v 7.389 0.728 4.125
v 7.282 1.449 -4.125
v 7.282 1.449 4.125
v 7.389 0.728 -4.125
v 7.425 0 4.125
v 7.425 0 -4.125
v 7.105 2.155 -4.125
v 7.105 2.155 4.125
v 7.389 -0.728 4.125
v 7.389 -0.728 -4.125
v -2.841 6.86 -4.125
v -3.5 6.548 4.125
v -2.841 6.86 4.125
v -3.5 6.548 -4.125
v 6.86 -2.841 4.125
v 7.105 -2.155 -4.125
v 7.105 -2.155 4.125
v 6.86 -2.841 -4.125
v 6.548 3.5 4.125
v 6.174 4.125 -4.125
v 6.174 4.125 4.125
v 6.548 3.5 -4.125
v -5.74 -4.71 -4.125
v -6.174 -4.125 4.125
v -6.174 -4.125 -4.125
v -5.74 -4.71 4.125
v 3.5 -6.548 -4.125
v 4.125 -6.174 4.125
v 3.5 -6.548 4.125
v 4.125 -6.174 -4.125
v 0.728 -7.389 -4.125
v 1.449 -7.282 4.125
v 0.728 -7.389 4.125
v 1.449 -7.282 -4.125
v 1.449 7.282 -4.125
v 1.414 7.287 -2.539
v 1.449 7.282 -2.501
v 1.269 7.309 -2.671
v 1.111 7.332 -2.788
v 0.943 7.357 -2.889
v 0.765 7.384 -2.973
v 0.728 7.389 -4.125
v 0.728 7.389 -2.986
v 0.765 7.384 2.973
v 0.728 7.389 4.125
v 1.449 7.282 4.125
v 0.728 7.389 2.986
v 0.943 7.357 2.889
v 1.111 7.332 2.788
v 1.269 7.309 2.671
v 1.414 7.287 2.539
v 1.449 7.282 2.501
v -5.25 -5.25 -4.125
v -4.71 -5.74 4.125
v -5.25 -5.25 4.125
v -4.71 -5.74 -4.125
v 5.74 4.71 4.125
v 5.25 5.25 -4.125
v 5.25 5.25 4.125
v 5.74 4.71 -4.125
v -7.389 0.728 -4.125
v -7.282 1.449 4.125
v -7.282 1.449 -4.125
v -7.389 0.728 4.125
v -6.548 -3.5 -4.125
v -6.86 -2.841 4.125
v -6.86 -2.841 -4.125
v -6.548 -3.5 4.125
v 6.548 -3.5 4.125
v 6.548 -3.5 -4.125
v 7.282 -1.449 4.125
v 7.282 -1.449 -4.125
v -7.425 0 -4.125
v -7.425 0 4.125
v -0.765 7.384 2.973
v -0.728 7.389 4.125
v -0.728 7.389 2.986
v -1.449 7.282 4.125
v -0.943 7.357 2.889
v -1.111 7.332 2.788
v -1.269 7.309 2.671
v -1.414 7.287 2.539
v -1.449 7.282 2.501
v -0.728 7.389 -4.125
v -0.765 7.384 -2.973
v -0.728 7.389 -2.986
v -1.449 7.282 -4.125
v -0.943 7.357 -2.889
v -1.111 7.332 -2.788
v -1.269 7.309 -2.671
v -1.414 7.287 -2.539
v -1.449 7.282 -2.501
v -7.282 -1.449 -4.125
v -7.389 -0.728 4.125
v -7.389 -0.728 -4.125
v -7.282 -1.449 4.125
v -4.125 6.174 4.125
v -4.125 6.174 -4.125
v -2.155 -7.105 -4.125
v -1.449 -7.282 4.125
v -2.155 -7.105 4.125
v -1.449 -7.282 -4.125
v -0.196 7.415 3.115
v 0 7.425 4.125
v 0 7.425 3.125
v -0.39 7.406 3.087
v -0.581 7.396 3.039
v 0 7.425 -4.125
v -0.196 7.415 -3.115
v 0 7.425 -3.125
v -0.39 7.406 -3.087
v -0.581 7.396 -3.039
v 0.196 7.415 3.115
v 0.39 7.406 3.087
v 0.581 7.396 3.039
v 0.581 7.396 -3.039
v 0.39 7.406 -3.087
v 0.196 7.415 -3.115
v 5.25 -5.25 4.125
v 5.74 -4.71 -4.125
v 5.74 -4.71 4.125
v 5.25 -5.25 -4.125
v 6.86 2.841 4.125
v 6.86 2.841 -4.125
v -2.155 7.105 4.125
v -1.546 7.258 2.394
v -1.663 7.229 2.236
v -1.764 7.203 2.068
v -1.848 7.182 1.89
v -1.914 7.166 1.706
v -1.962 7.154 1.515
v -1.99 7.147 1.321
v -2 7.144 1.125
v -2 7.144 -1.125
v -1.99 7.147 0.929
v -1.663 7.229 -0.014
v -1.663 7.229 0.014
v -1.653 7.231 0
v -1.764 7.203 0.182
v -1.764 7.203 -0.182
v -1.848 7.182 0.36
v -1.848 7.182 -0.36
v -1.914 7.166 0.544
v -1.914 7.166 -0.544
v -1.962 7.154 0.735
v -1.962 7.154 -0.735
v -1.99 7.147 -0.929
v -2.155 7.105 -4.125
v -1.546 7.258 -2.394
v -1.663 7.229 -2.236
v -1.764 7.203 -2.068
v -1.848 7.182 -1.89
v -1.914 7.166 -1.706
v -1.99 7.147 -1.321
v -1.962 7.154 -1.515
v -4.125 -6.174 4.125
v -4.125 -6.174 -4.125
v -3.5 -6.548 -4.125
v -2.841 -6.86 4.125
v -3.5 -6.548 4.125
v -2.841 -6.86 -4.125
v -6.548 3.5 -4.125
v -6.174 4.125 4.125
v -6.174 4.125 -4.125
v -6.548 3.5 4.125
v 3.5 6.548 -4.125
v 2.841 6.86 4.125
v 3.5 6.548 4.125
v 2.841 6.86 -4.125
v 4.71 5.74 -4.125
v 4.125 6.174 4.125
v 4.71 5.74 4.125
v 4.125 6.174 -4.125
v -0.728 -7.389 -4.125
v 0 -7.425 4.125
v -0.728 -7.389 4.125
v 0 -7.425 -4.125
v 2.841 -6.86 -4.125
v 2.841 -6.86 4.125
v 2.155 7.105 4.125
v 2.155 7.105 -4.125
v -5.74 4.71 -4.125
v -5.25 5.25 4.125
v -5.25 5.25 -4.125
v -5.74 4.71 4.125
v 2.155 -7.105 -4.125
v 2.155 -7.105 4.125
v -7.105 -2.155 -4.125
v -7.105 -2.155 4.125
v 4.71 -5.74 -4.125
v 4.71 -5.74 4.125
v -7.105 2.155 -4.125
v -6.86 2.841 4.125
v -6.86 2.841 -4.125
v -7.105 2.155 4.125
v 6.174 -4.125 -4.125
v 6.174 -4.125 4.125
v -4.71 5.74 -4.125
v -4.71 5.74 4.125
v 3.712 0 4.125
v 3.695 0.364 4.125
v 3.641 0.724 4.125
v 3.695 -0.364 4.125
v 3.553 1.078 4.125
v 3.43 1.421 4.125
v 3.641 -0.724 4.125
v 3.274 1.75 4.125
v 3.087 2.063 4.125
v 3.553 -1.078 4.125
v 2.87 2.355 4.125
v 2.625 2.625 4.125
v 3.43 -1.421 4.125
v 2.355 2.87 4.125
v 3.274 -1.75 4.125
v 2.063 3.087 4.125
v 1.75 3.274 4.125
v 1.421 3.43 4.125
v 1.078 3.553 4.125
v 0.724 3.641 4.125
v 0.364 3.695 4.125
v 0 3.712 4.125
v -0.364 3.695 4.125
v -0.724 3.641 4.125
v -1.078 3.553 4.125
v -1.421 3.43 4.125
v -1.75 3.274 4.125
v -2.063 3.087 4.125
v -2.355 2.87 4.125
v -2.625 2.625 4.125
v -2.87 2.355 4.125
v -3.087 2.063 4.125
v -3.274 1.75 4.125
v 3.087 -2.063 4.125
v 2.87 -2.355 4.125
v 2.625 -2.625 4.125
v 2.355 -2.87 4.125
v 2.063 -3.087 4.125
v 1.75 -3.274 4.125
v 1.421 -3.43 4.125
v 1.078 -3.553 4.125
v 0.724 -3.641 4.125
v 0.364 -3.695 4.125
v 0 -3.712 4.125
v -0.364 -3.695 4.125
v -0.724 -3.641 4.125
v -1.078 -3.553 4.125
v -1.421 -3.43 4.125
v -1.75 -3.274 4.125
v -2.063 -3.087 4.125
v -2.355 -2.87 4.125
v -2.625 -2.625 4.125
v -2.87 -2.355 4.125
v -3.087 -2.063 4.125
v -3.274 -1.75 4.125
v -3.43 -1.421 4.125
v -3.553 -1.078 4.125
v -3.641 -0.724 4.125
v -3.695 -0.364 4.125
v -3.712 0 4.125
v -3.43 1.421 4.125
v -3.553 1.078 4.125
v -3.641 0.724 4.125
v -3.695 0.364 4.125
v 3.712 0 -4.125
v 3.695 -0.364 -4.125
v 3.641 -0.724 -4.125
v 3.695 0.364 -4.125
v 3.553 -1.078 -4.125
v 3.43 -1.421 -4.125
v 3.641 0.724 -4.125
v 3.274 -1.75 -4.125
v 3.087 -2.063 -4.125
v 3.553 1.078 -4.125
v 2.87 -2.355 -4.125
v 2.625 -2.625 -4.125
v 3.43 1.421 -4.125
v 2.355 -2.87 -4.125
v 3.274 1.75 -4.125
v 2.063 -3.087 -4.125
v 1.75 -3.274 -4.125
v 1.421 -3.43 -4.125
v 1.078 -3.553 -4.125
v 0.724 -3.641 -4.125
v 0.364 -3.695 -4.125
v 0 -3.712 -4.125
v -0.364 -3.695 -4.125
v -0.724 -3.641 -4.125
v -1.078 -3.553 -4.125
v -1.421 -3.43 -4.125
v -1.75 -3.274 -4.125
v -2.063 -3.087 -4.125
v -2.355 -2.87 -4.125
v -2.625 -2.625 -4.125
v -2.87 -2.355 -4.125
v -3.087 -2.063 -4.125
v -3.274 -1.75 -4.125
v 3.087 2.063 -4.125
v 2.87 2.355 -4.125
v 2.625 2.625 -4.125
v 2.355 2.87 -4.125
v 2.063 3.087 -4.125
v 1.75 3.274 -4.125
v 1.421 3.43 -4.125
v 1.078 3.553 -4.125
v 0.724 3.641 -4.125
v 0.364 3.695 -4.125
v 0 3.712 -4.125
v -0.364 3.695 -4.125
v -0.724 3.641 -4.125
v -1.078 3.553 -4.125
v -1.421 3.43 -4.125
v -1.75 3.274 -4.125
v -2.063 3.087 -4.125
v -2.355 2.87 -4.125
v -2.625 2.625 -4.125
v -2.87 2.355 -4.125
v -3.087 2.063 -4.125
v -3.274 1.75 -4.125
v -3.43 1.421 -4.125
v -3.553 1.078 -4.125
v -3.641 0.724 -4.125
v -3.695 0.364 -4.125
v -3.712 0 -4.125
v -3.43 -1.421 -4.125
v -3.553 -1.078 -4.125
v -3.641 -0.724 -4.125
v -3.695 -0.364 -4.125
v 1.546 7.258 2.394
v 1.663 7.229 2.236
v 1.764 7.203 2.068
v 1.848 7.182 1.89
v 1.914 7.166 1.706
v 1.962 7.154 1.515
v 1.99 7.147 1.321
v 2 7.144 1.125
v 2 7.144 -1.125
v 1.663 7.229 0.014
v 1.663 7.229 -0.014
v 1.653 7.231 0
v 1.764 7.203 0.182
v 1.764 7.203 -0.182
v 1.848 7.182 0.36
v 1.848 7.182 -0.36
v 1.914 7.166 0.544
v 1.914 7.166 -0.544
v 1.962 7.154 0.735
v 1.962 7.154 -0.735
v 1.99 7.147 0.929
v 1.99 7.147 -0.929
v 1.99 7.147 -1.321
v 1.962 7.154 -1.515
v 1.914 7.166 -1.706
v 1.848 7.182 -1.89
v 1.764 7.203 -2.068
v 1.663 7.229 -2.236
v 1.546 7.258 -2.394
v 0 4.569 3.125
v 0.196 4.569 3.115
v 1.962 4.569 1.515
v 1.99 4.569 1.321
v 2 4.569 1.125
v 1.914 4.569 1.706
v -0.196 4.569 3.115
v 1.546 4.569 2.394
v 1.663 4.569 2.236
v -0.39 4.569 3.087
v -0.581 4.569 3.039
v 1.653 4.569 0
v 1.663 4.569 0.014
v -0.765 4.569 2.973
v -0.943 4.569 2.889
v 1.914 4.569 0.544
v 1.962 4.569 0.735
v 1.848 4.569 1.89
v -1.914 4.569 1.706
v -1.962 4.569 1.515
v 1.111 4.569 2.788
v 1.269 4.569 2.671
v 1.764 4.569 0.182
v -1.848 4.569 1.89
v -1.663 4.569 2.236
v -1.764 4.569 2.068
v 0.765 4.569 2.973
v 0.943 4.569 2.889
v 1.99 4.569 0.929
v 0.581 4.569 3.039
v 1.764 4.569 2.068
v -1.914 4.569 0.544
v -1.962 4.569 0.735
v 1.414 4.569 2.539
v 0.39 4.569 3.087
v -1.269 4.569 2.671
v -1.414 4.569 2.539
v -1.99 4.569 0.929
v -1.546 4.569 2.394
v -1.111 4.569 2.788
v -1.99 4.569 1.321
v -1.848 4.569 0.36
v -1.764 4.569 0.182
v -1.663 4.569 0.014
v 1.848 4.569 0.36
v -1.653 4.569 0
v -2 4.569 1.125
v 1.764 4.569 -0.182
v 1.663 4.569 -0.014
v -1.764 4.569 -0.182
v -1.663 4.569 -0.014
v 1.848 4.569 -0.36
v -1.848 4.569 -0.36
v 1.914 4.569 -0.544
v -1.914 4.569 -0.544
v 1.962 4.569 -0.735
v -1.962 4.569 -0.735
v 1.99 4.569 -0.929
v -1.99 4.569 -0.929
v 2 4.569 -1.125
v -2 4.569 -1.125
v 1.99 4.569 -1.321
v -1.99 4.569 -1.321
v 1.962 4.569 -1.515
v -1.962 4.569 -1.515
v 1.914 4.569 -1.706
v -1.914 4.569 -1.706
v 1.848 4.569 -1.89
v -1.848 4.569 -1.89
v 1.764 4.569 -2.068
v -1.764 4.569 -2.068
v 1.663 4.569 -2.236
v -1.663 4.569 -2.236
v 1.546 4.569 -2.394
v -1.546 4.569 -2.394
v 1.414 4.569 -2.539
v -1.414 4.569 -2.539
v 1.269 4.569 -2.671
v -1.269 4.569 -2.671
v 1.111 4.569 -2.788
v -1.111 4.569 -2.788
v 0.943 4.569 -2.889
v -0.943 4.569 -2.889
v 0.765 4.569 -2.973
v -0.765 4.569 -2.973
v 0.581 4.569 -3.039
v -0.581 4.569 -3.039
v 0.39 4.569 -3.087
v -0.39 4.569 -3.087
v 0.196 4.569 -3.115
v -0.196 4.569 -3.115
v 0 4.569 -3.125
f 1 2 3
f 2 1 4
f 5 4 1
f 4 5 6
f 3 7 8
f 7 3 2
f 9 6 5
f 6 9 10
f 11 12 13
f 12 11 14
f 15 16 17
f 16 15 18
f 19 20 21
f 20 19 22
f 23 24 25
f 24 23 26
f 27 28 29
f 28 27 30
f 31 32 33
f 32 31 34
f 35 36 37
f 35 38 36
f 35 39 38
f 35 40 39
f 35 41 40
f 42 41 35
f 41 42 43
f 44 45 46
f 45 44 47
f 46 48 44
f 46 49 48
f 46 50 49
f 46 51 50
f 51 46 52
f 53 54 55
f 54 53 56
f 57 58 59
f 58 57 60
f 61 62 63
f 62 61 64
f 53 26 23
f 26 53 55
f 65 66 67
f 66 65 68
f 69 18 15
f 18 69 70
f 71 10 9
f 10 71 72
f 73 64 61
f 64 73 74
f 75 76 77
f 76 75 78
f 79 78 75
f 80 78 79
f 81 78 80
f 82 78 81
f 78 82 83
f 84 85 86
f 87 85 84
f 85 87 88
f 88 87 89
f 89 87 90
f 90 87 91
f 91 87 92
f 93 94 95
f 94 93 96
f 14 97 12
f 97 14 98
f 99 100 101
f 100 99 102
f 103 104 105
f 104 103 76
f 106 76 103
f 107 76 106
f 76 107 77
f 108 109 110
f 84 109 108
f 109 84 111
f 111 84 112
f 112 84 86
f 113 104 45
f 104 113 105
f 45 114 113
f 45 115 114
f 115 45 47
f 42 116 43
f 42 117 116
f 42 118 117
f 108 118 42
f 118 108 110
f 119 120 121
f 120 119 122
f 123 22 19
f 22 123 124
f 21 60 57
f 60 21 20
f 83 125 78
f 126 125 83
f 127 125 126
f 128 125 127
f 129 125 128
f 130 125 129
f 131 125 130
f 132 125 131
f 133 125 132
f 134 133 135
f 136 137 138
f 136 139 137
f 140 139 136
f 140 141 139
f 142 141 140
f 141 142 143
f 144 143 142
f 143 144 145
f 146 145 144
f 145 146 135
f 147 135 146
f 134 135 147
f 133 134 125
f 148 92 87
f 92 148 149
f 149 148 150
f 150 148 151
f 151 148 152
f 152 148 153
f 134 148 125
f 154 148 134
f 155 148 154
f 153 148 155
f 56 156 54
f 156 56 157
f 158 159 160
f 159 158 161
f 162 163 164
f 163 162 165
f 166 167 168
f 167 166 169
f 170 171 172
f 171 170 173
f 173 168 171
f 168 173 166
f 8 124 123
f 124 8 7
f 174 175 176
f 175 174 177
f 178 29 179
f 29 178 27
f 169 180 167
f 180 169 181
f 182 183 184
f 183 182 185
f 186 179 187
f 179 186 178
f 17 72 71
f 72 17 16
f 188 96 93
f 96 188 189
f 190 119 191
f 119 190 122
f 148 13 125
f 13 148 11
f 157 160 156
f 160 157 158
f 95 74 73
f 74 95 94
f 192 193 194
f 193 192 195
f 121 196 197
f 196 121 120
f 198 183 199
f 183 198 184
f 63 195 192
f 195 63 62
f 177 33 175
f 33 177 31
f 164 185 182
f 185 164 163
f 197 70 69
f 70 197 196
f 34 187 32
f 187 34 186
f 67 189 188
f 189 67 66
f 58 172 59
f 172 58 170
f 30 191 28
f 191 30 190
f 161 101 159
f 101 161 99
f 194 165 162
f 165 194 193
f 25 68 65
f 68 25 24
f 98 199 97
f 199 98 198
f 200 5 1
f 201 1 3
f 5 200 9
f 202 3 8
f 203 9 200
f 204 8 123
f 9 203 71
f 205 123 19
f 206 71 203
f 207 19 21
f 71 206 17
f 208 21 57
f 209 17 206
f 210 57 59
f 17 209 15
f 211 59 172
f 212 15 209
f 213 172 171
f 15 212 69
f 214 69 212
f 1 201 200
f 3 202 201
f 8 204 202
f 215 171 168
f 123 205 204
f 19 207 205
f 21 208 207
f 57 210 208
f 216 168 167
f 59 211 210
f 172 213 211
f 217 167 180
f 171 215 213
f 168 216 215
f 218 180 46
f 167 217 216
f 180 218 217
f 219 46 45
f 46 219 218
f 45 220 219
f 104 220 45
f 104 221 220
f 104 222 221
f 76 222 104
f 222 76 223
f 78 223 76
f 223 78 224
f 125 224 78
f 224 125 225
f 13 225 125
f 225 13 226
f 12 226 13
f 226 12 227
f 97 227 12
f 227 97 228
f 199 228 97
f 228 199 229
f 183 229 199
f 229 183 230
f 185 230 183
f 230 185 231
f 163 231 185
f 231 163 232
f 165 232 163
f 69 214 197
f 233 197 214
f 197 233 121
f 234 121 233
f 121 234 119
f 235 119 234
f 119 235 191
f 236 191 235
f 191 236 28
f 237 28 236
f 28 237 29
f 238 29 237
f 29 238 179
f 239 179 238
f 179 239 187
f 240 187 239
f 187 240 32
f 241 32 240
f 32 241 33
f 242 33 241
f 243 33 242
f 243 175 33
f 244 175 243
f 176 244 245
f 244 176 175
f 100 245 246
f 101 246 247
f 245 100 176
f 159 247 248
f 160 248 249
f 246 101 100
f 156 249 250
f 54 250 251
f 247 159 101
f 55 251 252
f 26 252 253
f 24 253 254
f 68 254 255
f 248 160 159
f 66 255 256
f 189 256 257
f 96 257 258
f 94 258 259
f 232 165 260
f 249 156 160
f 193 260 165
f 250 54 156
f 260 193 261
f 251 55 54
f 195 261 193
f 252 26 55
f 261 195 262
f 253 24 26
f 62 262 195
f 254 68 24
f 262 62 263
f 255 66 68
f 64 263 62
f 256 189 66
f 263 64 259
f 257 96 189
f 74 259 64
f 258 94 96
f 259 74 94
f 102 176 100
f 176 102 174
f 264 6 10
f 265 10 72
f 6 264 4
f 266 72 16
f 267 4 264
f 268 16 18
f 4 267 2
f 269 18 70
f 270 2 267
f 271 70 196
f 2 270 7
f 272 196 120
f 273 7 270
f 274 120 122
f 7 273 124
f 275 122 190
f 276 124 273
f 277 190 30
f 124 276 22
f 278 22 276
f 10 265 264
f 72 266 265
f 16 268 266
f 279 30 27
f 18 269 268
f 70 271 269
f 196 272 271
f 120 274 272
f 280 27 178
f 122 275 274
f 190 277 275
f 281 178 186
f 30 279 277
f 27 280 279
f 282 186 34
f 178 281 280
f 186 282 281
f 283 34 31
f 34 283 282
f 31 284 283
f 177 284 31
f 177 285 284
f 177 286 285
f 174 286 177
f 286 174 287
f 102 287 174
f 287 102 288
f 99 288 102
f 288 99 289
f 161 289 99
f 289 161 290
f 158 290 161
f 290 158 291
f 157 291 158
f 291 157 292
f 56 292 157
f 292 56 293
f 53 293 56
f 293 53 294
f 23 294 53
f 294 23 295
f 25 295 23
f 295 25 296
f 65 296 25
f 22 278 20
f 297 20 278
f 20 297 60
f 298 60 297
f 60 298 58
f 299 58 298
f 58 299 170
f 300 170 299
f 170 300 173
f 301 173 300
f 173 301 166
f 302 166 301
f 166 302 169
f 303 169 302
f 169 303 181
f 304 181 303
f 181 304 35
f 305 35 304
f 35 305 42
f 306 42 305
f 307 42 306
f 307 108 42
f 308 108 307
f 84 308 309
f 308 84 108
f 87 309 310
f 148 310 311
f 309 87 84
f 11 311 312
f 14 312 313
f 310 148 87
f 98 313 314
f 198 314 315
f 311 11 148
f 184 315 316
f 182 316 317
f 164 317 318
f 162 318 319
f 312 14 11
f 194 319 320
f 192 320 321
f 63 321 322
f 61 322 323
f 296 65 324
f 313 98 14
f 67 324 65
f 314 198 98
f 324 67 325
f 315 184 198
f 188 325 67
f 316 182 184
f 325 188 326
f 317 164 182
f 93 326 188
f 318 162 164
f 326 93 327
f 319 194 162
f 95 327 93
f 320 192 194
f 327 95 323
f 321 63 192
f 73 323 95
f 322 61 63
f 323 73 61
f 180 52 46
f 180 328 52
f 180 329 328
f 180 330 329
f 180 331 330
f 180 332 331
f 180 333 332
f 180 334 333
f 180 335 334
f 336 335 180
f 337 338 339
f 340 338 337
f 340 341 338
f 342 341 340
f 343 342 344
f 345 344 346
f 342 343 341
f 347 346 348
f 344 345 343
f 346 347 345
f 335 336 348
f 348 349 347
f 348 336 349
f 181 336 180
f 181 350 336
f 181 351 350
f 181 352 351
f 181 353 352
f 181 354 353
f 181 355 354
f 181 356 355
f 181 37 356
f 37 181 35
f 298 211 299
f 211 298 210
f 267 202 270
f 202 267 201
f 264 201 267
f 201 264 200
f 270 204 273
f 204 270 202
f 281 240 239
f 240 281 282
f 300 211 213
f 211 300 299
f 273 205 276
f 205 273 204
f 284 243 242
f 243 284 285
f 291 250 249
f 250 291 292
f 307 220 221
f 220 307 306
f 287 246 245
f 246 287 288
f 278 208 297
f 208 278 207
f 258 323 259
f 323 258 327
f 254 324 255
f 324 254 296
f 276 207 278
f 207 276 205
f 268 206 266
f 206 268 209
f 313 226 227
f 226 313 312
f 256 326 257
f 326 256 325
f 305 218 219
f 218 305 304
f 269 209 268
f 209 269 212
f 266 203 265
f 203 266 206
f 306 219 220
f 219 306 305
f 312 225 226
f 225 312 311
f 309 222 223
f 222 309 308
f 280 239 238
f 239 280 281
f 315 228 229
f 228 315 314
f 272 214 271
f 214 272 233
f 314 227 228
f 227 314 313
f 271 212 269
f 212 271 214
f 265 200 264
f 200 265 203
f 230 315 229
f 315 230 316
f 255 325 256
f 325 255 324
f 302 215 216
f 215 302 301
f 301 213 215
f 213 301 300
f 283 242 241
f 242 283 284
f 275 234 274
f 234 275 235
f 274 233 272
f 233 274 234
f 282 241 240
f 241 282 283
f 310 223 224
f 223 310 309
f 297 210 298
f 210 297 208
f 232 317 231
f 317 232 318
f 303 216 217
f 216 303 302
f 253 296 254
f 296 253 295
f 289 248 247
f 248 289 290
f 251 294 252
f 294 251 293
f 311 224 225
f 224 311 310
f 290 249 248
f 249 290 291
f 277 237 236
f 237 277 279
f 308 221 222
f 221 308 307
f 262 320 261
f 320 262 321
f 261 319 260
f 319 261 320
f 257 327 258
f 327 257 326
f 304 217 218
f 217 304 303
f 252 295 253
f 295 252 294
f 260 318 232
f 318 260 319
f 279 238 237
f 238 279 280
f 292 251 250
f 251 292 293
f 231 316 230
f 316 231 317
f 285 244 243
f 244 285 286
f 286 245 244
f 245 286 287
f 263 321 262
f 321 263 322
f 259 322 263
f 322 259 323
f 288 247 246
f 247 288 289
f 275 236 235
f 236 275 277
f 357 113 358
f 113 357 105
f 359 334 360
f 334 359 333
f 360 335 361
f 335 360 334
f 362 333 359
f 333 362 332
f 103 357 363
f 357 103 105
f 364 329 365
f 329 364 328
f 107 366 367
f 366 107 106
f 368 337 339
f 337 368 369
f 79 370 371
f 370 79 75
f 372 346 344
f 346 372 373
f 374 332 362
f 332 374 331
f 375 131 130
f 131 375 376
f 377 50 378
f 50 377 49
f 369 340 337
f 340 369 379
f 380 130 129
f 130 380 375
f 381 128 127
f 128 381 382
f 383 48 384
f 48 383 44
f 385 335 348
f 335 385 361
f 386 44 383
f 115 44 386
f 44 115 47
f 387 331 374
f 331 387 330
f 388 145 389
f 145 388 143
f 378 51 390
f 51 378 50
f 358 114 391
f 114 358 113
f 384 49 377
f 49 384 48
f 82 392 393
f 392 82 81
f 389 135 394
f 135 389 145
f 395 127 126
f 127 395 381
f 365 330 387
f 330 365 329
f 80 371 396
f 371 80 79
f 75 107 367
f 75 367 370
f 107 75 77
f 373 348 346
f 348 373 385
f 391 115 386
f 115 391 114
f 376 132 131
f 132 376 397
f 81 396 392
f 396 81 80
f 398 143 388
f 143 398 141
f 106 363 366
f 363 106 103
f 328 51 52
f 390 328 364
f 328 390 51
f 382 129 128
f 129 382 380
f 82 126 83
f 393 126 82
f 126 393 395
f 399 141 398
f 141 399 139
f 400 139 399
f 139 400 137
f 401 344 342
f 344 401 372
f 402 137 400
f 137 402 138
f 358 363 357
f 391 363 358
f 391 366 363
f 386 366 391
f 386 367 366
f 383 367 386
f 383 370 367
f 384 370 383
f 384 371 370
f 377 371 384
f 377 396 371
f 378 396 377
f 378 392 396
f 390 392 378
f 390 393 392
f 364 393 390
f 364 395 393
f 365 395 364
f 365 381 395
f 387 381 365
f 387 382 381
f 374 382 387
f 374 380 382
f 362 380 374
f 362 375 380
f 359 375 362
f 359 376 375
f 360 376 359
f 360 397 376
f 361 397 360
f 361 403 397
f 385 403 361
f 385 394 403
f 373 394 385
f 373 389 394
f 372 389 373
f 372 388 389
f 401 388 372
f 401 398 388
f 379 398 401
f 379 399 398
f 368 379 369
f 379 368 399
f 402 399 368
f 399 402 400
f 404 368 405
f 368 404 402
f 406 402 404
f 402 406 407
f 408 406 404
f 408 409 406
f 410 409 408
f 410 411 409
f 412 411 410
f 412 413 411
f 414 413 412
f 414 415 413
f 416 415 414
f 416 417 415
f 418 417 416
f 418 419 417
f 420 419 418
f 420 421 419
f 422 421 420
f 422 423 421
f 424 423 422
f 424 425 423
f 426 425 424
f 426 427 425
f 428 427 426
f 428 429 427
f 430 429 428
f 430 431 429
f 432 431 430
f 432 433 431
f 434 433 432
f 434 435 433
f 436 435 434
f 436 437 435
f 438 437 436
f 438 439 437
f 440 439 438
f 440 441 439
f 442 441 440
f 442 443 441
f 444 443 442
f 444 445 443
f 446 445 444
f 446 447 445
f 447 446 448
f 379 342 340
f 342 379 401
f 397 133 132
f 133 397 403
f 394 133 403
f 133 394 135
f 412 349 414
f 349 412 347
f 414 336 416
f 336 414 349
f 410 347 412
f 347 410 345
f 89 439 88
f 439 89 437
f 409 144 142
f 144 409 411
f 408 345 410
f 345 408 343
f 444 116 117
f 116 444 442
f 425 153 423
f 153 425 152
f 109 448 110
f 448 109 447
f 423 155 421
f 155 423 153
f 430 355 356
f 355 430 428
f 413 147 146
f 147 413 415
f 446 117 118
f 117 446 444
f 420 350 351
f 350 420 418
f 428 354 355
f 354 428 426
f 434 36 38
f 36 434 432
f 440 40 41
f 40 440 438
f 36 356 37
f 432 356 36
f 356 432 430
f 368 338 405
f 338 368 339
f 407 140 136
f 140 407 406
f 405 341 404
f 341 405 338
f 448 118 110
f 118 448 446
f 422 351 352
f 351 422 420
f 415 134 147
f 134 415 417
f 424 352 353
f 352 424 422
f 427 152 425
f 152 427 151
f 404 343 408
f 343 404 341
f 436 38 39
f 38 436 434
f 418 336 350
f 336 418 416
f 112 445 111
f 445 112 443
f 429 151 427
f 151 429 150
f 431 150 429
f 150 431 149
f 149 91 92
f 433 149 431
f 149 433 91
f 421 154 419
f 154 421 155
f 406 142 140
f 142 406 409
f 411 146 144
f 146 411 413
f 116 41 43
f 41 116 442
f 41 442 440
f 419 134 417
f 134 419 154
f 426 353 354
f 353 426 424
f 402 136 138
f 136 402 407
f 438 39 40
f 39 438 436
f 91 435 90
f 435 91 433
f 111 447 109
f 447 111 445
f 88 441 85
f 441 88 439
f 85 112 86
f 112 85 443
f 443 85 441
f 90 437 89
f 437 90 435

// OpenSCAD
// COBRA Vertebra - L1 V19
// Height: 8.25mm, OD: 14.850000000000001mm

$fn = 64;

difference() {
    // Outer cylinder
    cylinder(h=8.25, d=14.850000000000001, center=true);
    
    // Inner channel
    cylinder(h=10.25, d=7.425000000000001, center=true);

    // Pivot holes
    translate([0, 7.425000000000001, 1.125])
    rotate([90, 0, 0])
    cylinder(h=5.7125, d=4, center=true);
    
    translate([0, 7.425000000000001, -1.125])
    rotate([90, 0, 0])
    cylinder(h=5.7125, d=4, center=true);
}
